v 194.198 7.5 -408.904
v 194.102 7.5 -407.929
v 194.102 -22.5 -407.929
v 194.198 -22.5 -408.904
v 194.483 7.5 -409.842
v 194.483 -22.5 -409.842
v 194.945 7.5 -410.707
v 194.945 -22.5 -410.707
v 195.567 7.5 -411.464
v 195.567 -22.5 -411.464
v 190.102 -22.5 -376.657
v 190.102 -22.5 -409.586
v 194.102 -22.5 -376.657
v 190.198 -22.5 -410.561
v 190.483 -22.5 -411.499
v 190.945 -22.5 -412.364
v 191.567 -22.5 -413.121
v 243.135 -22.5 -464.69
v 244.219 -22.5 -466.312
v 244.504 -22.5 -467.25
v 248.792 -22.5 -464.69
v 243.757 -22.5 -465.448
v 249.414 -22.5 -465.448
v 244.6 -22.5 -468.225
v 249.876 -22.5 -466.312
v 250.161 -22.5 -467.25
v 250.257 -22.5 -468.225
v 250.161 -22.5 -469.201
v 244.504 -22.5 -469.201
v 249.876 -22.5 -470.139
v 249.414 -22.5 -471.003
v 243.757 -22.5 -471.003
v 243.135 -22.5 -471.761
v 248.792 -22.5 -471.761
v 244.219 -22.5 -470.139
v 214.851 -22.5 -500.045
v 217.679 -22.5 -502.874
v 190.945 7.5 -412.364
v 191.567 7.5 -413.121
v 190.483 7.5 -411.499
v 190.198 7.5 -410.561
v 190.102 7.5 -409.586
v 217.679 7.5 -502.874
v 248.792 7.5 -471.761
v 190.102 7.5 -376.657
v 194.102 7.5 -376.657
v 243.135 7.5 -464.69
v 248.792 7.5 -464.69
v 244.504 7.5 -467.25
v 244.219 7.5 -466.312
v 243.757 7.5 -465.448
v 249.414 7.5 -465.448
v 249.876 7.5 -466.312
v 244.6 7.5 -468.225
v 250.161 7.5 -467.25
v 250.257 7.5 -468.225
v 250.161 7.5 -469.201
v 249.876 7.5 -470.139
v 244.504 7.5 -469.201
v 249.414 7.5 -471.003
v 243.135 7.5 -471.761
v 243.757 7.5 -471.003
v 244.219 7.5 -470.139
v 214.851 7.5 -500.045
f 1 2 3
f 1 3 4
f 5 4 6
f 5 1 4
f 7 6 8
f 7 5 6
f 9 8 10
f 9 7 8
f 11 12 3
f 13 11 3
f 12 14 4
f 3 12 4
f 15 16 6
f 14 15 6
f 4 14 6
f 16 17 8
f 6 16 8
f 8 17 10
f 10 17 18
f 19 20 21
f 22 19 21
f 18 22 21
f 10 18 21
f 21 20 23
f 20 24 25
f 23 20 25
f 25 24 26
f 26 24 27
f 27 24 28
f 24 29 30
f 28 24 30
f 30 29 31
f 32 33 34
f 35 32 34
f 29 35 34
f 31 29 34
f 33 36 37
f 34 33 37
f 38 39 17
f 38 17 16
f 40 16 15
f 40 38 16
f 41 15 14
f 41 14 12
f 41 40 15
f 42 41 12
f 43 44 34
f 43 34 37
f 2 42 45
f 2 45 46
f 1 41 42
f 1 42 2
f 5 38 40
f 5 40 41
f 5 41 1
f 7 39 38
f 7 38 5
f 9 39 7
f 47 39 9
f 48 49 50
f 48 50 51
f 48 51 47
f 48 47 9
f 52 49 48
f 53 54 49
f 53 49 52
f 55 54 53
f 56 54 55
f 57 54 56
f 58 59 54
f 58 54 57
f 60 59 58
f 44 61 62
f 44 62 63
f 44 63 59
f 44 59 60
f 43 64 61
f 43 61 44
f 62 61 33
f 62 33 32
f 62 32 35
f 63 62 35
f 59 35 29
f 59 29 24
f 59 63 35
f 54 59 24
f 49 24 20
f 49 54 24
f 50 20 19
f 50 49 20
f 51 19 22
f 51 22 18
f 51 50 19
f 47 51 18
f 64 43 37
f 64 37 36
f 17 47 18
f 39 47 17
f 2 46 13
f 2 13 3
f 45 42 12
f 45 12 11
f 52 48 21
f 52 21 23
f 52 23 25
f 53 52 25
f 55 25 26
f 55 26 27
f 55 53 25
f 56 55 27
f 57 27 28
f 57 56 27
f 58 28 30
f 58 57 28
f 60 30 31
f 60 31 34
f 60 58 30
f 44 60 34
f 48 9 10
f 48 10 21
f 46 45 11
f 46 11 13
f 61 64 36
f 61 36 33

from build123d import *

# Parameters (mm, degrees)
BOSS_EXTRUDE1_DEPTH = 30


with BuildPart() as part:
    # Sketch1 → Boss-Extrude1 (new body)
    with BuildSketch(Plane(origin=(0, 7.5, 0), x_dir=(1, 0, 0), z_dir=(0, 1, 0))):
        with BuildLine():
            Line((248.792121733, 471.76093065), (217.679423361, 502.873629023))
            Line((217.679423361, 502.873629023), (214.850996236, 500.045201898))
            Line((214.850996236, 500.045201898), (243.135267484, 471.76093065))
            ThreePointArc((243.135267484, 471.76093065), (244.599733578, 468.225396744), (243.135267484, 464.689862838))
            Line((243.135267484, 464.689862838), (191.566724989, 413.121320344))
            ThreePointArc((191.566724989, 413.121320344), (190.482861232, 411.499203599), (190.102258895, 409.585786438))
            Line((190.102258895, 409.585786438), (190.102258895, 376.656854249))
            Line((190.102258895, 376.656854249), (194.102258895, 376.656854249))
            Line((194.102258895, 376.656854249), (194.102258895, 407.928932188))
            ThreePointArc((194.102258895, 407.928932188), (194.482861232, 409.84234935), (195.566724989, 411.464466094))
            Line((195.566724989, 411.464466094), (248.792121733, 464.689862838))
            ThreePointArc((248.792121733, 464.689862838), (250.256587827, 468.225396744), (248.792121733, 471.76093065))
        make_face()
    extrude(amount=-BOSS_EXTRUDE1_DEPTH)


solid = part.part
